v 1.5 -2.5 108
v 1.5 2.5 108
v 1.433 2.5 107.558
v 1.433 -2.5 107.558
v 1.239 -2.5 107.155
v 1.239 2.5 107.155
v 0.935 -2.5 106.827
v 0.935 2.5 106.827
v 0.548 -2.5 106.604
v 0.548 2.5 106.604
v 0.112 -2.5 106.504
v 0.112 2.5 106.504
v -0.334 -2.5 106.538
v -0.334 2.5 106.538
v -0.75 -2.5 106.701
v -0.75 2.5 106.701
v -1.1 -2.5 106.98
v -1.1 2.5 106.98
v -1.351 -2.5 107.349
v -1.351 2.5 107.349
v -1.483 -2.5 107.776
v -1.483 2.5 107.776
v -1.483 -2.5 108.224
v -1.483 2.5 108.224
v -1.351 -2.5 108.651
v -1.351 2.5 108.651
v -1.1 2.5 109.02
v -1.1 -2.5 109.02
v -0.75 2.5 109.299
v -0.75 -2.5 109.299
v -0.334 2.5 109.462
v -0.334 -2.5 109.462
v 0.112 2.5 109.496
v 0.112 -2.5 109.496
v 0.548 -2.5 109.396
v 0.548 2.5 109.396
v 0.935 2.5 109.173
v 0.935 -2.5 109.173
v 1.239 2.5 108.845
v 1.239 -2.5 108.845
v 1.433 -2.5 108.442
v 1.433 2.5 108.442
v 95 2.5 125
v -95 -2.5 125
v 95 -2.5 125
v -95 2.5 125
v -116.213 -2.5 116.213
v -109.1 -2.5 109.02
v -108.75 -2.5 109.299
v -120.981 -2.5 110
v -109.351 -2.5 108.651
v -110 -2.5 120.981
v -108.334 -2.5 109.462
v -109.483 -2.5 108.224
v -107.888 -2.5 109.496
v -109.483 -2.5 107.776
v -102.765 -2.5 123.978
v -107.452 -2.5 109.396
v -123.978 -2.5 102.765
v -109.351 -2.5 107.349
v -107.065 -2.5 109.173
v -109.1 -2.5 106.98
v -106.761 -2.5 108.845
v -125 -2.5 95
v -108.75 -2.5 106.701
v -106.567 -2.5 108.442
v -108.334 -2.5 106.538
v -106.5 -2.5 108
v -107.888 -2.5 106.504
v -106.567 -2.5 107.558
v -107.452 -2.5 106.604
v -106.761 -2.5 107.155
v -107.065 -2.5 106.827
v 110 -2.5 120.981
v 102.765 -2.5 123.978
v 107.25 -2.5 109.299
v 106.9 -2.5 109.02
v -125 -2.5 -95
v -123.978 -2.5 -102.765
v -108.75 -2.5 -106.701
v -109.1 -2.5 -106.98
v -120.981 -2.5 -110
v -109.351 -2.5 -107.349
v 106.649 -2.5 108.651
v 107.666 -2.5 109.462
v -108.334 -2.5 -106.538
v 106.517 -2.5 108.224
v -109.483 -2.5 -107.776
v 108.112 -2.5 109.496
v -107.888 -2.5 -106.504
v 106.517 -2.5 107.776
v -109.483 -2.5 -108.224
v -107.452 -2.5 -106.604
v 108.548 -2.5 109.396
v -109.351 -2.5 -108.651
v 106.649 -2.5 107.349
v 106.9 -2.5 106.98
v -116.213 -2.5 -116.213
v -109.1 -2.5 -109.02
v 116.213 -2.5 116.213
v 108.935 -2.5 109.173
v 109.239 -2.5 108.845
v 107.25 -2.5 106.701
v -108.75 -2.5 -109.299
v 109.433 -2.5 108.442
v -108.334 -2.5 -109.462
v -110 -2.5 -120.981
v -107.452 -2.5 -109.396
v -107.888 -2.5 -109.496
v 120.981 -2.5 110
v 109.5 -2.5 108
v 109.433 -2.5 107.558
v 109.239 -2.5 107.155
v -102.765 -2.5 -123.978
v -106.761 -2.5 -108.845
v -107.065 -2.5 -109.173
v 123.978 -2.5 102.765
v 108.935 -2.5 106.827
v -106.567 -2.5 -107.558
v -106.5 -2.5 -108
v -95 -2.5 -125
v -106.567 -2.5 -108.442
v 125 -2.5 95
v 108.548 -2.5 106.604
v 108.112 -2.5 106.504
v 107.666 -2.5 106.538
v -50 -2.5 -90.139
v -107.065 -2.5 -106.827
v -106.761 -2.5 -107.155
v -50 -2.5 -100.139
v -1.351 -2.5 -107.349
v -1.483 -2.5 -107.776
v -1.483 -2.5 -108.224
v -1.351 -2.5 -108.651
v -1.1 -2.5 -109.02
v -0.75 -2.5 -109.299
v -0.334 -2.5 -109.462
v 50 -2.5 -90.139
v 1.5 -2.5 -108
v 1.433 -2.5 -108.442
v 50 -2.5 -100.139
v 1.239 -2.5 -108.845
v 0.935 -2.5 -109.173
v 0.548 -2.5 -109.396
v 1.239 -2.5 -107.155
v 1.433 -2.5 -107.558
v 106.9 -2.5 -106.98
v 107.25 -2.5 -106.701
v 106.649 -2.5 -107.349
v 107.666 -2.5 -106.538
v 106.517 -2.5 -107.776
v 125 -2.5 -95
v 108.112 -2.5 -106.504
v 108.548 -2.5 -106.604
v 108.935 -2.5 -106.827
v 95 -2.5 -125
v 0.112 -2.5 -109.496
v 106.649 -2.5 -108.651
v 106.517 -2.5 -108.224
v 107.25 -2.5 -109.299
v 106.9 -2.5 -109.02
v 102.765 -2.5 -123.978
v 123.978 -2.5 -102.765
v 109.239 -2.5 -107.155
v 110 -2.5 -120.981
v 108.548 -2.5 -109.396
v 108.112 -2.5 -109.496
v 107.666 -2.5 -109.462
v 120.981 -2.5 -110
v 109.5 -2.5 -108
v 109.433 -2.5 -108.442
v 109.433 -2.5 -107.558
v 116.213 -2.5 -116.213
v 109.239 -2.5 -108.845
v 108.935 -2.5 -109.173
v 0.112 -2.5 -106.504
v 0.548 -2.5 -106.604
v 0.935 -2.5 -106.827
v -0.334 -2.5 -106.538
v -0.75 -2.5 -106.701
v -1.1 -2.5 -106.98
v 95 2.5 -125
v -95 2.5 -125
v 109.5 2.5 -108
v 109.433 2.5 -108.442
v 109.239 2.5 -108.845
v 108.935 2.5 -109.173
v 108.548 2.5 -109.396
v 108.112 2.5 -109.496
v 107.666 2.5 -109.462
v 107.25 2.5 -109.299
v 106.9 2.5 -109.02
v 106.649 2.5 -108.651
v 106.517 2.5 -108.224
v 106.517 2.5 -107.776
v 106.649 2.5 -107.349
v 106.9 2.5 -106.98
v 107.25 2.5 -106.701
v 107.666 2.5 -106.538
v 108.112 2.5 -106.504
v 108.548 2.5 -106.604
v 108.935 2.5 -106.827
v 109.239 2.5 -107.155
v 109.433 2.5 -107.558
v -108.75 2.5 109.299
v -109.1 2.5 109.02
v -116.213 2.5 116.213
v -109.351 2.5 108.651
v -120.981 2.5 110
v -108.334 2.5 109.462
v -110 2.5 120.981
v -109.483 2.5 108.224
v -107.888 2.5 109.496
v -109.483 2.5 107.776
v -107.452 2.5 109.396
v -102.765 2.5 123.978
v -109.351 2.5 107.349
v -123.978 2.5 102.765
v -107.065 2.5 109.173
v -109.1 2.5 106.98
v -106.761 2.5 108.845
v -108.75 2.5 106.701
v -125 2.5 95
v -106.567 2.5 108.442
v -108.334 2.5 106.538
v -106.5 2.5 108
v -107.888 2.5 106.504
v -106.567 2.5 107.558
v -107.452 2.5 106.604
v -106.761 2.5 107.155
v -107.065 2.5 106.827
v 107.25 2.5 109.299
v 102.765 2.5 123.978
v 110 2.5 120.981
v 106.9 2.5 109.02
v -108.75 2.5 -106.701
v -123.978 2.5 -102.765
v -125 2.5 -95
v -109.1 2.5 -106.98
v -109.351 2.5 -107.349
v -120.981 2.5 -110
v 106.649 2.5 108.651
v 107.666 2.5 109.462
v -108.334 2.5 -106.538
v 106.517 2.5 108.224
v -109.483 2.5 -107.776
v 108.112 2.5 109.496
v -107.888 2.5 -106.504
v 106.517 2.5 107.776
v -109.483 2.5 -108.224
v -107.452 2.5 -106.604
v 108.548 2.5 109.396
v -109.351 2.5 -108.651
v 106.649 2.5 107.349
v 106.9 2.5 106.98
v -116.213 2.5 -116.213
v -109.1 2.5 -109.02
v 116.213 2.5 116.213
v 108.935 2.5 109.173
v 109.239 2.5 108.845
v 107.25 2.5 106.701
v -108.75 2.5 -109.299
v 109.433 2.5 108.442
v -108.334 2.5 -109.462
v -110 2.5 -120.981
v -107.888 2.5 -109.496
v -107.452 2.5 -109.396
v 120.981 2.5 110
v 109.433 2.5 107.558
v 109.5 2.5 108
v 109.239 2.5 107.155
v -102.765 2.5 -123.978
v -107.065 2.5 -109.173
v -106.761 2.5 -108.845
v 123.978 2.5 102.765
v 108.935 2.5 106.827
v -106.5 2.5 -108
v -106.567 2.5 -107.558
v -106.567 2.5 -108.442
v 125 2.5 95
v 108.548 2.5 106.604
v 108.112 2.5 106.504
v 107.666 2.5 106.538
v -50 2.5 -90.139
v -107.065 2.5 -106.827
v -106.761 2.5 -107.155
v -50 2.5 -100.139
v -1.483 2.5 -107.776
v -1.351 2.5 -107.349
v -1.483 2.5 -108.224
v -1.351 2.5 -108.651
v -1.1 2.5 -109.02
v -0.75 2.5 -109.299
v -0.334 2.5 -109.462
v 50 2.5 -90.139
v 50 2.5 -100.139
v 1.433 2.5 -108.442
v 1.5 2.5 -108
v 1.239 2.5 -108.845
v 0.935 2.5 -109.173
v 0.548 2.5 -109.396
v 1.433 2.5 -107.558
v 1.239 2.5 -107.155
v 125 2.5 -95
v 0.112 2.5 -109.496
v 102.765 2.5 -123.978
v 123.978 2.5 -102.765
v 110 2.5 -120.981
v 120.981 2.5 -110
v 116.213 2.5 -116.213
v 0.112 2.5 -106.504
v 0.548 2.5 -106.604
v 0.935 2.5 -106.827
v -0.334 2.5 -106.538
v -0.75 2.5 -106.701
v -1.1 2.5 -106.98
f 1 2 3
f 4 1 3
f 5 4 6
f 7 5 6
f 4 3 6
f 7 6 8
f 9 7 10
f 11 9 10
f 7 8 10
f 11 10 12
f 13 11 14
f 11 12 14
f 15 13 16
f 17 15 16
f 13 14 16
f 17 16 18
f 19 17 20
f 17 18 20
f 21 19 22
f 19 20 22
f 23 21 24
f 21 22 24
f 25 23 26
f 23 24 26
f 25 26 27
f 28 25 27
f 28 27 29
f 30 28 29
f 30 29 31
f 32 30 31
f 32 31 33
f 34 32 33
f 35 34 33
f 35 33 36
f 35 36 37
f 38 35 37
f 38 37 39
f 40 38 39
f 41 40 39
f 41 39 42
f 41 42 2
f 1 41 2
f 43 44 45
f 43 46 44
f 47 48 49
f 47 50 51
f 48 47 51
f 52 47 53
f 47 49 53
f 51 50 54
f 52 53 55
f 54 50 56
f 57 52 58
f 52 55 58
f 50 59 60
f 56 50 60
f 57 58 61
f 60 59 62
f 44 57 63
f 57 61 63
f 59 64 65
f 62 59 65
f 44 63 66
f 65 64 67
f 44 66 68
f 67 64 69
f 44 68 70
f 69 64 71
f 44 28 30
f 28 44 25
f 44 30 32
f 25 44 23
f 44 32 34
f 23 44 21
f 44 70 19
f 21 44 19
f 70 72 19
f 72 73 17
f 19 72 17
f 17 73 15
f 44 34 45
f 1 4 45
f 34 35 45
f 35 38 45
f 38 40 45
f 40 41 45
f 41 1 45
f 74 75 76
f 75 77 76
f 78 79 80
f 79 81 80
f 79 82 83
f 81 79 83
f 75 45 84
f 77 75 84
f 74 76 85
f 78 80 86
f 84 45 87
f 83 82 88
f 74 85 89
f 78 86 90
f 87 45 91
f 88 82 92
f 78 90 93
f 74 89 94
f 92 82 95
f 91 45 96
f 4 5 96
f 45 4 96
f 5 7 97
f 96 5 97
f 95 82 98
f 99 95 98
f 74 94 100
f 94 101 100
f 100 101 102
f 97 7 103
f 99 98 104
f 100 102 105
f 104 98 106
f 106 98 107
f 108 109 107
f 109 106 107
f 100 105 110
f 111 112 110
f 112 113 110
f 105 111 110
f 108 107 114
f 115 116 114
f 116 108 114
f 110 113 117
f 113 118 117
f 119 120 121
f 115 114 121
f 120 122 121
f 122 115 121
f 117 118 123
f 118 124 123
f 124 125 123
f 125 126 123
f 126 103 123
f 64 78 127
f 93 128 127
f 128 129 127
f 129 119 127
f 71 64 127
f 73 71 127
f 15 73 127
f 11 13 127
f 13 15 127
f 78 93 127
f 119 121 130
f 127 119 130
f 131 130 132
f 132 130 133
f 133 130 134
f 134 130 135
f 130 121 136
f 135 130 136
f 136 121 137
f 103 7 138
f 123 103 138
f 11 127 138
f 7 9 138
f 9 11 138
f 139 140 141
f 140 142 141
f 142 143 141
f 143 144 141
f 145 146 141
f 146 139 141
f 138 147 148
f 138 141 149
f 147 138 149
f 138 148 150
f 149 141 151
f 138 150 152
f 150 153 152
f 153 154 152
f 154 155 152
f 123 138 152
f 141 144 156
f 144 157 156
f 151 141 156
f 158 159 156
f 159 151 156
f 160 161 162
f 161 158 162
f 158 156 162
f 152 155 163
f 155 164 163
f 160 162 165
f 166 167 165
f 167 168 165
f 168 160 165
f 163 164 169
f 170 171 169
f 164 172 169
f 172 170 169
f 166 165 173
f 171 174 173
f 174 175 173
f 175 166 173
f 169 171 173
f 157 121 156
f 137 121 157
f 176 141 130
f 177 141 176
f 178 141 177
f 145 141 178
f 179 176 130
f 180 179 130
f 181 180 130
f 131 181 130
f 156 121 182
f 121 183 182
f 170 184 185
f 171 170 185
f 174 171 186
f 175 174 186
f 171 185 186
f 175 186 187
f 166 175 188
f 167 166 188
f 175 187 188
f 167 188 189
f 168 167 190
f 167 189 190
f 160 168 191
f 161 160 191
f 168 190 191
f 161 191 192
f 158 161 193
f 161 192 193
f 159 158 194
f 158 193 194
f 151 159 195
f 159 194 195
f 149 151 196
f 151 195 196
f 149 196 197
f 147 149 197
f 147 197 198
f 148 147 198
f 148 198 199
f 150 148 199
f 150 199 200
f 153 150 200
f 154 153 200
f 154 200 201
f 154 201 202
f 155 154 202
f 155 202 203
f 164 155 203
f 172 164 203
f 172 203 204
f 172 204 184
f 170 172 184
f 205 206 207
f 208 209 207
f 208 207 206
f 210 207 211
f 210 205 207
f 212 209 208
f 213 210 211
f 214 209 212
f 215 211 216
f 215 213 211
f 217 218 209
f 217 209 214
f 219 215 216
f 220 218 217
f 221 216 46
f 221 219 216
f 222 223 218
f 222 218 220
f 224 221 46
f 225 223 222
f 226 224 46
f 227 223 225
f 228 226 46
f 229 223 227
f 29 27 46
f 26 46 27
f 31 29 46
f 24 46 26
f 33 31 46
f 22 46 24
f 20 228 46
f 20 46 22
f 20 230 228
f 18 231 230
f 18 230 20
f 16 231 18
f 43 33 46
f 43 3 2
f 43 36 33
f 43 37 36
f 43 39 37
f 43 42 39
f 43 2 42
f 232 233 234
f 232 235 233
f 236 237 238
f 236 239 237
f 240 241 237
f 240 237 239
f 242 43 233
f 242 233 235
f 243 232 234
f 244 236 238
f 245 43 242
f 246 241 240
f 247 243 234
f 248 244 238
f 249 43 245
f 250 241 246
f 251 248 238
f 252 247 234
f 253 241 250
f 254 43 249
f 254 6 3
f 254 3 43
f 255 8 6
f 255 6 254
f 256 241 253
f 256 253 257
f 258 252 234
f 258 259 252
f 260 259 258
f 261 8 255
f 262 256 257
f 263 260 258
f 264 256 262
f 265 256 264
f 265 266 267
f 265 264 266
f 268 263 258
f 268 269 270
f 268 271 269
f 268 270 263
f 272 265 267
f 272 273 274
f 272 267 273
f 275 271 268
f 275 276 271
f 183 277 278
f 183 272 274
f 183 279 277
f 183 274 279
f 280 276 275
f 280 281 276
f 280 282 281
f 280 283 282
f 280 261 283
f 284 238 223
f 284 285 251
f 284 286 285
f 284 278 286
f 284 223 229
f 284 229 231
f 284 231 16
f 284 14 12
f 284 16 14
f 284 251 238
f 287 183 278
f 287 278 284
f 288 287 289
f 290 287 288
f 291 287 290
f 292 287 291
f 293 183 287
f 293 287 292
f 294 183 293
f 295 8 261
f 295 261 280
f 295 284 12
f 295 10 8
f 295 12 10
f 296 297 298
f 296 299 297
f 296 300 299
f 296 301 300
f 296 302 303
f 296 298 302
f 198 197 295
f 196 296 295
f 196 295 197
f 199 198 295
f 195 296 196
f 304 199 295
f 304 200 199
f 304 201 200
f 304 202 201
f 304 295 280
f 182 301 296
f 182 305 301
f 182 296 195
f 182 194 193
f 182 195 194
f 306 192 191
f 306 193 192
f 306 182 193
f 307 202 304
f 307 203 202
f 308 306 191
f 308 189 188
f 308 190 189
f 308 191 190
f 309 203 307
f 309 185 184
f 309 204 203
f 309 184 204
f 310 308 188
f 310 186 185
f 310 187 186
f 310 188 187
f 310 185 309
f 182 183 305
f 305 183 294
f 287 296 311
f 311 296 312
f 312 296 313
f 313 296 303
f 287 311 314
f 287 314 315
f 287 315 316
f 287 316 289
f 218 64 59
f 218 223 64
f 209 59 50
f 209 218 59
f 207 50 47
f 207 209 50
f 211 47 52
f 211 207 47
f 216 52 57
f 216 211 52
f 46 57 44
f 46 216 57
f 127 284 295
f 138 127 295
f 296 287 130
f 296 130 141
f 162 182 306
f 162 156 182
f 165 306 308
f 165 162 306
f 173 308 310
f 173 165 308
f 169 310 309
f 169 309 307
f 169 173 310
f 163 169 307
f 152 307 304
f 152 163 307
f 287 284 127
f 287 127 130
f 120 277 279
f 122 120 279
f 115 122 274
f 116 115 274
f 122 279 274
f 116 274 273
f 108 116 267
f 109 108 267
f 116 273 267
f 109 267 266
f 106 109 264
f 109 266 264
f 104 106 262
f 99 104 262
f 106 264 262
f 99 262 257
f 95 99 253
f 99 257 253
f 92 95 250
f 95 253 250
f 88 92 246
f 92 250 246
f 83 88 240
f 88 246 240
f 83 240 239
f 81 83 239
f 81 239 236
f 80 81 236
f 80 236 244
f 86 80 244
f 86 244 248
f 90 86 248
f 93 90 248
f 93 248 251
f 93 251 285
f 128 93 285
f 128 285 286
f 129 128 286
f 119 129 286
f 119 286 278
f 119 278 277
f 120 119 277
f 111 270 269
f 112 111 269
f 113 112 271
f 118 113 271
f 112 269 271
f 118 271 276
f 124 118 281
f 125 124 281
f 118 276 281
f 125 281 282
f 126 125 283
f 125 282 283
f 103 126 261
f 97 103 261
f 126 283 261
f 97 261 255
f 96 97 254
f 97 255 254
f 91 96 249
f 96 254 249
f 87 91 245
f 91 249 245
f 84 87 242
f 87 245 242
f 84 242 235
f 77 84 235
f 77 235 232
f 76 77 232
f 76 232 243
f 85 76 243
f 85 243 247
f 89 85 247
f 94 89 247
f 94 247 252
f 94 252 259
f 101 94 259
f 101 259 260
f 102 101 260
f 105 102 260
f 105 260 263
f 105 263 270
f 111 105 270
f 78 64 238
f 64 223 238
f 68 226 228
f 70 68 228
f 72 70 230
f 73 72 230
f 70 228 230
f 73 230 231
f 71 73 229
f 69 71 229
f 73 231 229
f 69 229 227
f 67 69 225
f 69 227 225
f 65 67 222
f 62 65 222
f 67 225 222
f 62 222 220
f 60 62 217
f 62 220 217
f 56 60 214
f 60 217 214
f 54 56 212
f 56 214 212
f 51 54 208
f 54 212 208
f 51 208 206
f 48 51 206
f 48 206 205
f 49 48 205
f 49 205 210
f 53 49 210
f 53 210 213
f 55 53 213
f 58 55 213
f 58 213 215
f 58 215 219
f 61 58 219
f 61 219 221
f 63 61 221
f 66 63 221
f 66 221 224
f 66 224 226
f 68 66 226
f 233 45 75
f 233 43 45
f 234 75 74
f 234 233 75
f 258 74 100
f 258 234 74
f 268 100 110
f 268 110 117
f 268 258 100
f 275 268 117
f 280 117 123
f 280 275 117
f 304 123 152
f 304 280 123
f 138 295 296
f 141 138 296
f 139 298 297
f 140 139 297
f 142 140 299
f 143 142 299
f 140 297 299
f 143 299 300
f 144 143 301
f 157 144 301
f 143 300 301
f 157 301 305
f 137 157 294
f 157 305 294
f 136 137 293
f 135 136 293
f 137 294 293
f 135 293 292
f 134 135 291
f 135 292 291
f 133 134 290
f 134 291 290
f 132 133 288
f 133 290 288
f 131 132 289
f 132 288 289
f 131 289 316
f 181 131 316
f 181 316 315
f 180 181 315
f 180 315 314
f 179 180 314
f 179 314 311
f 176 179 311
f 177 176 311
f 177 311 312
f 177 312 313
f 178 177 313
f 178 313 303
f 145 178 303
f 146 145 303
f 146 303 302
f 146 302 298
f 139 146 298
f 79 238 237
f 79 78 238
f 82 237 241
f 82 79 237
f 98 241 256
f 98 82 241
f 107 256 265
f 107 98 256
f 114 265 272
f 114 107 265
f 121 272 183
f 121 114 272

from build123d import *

# Parameters (mm, degrees)
SKETCH1_W           = 250
SKETCH1_H           = 250
BOSS_EXTRUDE1_DEPTH = 2.5
CUT_EXTRUDE1_REACH  = 7
SKETCH2_W           = 100
SKETCH2_H           = 10
CUT_EXTRUDE2_REACH  = 7
SKETCH4_R           = 1.5
FILLET1_R           = 30


with BuildPart() as part:
    # Sketch1 → Boss-Extrude1 (new body, symmetric)
    with BuildSketch(Plane(origin=(0, 0, 0), x_dir=(1, 0, 0), z_dir=(0, 1, 0))):
        Rectangle(SKETCH1_W, SKETCH1_H)
    extrude(amount=BOSS_EXTRUDE1_DEPTH, both=True)

    # Sketch2 → Cut-Extrude1 (cut, up to next)
    with BuildSketch(Plane(origin=(0, 2.5, 0), x_dir=(1, 0, 0), z_dir=(0, 1, 0)), mode=Mode.PRIVATE) as cut_extrude1_sk1:
        with Locations((0, 95.139170266)):
            Rectangle(SKETCH2_W, SKETCH2_H)
    cut_extrude1_tool1 = extrude(cut_extrude1_sk1.sketch, amount=-CUT_EXTRUDE1_REACH, mode=Mode.PRIVATE) & part.part
    add(cut_extrude1_tool1.solids().sort_by_distance((0, 2.5, -95.13917))[0], mode=Mode.SUBTRACT)

    # Sketch4 → Cut-Extrude2 (cut, up to next)
    with BuildSketch(Plane(origin=(0, 2.5, 0), x_dir=(1, 0, 0), z_dir=(0, 1, 0)), mode=Mode.PRIVATE) as cut_extrude2_sk1:
        with Locations((-108, 108)):
            Circle(SKETCH4_R)
    cut_extrude2_tool1 = extrude(cut_extrude2_sk1.sketch, amount=-CUT_EXTRUDE2_REACH, mode=Mode.PRIVATE) & part.part
    add(cut_extrude2_tool1.solids().sort_by_distance((-108, 2.5, -108))[0], mode=Mode.SUBTRACT)
    # Sketch4 → Cut-Extrude2 (cut, up to next)
    with BuildSketch(Plane(origin=(0, 2.5, 0), x_dir=(1, 0, 0), z_dir=(0, 1, 0)), mode=Mode.PRIVATE) as cut_extrude2_sk2:
        with Locations((0, 108)):
            Circle(SKETCH4_R)
    cut_extrude2_tool2 = extrude(cut_extrude2_sk2.sketch, amount=-CUT_EXTRUDE2_REACH, mode=Mode.PRIVATE) & part.part
    add(cut_extrude2_tool2.solids().sort_by_distance((0, 2.5, -108))[0], mode=Mode.SUBTRACT)
    # Sketch4 → Cut-Extrude2 (cut, up to next)
    with BuildSketch(Plane(origin=(0, 2.5, 0), x_dir=(1, 0, 0), z_dir=(0, 1, 0)), mode=Mode.PRIVATE) as cut_extrude2_sk3:
        with Locations((108, 108)):
            Circle(SKETCH4_R)
    cut_extrude2_tool3 = extrude(cut_extrude2_sk3.sketch, amount=-CUT_EXTRUDE2_REACH, mode=Mode.PRIVATE) & part.part
    add(cut_extrude2_tool3.solids().sort_by_distance((108, 2.5, -108))[0], mode=Mode.SUBTRACT)
    # Sketch4 → Cut-Extrude2 (cut, up to next)
    with BuildSketch(Plane(origin=(0, 2.5, 0), x_dir=(1, 0, 0), z_dir=(0, 1, 0)), mode=Mode.PRIVATE) as cut_extrude2_sk4:
        with Locations((108, -108)):
            Circle(SKETCH4_R)
    cut_extrude2_tool4 = extrude(cut_extrude2_sk4.sketch, amount=-CUT_EXTRUDE2_REACH, mode=Mode.PRIVATE) & part.part
    add(cut_extrude2_tool4.solids().sort_by_distance((108, 2.5, 108))[0], mode=Mode.SUBTRACT)
    # Sketch4 → Cut-Extrude2 (cut, up to next)
    with BuildSketch(Plane(origin=(0, 2.5, 0), x_dir=(1, 0, 0), z_dir=(0, 1, 0)), mode=Mode.PRIVATE) as cut_extrude2_sk5:
        with Locations((0, -108)):
            Circle(SKETCH4_R)
    cut_extrude2_tool5 = extrude(cut_extrude2_sk5.sketch, amount=-CUT_EXTRUDE2_REACH, mode=Mode.PRIVATE) & part.part
    add(cut_extrude2_tool5.solids().sort_by_distance((0, 2.5, 108))[0], mode=Mode.SUBTRACT)
    # Sketch4 → Cut-Extrude2 (cut, up to next)
    with BuildSketch(Plane(origin=(0, 2.5, 0), x_dir=(1, 0, 0), z_dir=(0, 1, 0)), mode=Mode.PRIVATE) as cut_extrude2_sk6:
        with Locations((-108, -108)):
            Circle(SKETCH4_R)
    cut_extrude2_tool6 = extrude(cut_extrude2_sk6.sketch, amount=-CUT_EXTRUDE2_REACH, mode=Mode.PRIVATE) & part.part
    add(cut_extrude2_tool6.solids().sort_by_distance((-108, 2.5, 108))[0], mode=Mode.SUBTRACT)

    # Fillet1
    fillet1_edges = [part.edges().sort_by_distance(p)[0] for p in [
        (125, 0, 125),
        (-125, 0, 125),
        (-125, 0, -125),
        (125, 0, -125),
    ]]
    fillet(fillet1_edges, radius=FILLET1_R)


solid = part.part
